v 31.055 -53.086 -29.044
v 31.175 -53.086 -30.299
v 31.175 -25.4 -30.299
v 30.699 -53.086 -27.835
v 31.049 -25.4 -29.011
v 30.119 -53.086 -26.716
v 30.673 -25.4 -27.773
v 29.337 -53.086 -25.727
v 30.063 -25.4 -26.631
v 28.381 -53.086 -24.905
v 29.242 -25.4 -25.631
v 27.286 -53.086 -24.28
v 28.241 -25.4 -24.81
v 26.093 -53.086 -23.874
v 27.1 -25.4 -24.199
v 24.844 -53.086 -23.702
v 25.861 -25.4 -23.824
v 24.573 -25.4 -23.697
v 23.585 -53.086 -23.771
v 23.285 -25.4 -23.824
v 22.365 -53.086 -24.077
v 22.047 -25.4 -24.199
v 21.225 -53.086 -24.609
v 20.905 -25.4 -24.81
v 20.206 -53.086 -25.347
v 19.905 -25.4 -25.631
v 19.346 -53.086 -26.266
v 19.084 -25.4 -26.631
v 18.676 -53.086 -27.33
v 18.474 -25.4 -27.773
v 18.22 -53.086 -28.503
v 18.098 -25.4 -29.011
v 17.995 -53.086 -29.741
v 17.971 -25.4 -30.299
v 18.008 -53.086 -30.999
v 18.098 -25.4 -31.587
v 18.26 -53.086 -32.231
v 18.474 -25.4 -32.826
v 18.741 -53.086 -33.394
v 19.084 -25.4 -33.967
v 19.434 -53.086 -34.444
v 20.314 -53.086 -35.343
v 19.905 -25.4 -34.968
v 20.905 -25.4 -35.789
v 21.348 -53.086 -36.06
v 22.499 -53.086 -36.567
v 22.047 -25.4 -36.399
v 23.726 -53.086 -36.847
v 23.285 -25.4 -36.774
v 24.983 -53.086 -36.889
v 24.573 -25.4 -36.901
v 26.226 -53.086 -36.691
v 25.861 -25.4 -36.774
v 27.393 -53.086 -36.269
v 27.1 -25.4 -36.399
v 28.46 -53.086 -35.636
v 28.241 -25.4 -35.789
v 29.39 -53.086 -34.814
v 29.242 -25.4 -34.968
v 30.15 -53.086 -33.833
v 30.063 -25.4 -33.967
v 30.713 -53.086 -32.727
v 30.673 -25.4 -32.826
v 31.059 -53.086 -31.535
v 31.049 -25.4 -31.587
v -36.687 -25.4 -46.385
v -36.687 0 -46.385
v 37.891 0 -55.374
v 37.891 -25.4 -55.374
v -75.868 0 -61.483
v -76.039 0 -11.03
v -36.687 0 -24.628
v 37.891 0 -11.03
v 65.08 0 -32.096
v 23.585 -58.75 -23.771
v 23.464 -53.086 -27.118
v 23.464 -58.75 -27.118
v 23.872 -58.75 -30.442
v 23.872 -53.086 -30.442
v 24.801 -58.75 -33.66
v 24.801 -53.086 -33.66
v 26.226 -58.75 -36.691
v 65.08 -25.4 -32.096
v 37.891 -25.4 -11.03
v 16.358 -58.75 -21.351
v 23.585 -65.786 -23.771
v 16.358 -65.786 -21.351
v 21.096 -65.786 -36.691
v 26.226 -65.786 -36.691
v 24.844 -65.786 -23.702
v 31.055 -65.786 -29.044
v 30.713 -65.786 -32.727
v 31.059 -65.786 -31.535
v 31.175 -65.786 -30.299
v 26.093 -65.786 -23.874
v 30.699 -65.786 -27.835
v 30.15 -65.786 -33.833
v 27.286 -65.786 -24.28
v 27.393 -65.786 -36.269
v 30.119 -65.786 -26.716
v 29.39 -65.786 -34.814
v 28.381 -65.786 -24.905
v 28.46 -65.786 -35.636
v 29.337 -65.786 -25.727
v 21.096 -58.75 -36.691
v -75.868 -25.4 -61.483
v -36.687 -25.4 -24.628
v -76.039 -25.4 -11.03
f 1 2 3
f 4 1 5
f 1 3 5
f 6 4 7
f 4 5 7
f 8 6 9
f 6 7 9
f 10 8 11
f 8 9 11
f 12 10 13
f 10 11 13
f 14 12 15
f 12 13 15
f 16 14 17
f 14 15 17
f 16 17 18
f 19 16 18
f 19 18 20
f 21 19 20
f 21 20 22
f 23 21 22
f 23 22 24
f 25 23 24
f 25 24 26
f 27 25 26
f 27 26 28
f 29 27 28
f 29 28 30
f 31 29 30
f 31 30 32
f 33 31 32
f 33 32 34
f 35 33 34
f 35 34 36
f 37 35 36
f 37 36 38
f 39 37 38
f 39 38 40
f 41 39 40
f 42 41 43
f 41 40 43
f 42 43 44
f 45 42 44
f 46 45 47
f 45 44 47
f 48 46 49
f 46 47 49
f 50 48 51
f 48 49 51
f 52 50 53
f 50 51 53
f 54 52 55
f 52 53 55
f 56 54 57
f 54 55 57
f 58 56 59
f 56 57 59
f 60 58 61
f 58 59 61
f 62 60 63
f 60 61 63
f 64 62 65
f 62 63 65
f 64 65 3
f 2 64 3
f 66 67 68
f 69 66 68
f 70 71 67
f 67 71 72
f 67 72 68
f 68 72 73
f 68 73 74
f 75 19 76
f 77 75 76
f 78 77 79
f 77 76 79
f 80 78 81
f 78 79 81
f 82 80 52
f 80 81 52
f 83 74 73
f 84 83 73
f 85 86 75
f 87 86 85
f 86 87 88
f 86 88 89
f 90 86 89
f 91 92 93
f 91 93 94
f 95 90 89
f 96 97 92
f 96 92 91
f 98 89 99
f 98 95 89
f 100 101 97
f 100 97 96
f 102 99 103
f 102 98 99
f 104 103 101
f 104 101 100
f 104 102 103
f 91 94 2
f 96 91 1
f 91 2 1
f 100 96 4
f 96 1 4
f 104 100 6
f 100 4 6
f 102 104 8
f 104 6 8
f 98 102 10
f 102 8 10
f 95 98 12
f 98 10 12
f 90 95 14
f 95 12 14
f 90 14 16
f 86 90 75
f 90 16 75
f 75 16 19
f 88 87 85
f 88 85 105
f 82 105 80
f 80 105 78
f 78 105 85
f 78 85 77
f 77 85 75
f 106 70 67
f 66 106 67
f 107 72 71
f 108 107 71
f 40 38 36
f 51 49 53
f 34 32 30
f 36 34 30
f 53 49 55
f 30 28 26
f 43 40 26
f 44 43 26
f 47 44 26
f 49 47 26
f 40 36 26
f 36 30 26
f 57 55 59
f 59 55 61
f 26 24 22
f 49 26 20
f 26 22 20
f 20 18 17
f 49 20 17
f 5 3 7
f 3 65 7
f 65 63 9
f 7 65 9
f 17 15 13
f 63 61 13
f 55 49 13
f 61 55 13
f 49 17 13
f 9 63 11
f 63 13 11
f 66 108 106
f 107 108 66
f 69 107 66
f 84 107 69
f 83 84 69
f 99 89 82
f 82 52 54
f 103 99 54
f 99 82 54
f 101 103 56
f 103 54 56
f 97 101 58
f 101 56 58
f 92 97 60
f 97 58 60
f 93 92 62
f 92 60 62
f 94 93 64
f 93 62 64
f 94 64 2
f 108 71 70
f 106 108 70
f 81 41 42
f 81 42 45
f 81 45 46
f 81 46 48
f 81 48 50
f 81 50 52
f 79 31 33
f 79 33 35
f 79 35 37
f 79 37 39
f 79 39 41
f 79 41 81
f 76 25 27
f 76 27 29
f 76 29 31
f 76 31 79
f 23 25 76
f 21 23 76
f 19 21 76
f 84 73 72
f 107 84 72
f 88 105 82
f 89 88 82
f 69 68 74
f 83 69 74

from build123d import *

# Parameters (mm, degrees)
F0_R     = 4.7594660515
F1_DEPTH = 25.4
F2_R     = 6.6022269286
F3_DEPTH = 27.686
F5_DEPTH = 12.7
F7_DEPTH = 7.0358


with BuildPart() as f1:
    # F0 (on Front) → F1 (new body)
    with BuildSketch(Plane.XZ):
        Polygon((-36.6872698069, -24.628309533), (-76.0387508444, -11.0303815454), (-75.8683719788, -61.4831332203), (-36.6872698069, -46.384561923), (37.8912314773, -55.3742349148), (65.0804936886, -32.0959575474), (37.8912314773, -11.0303815454), align=None)
        with Locations((26.4151897281, -32.2757959366)):
            Circle(F0_R, mode=Mode.SUBTRACT)
        with Locations((26.4151897281, -32.2757959366)):
            Circle(F0_R)
    extrude(amount=F1_DEPTH)


with BuildPart() as f3:
    # F2 (on face) → F3 (new body)
    with BuildSketch(Plane.XZ.offset(25.4)):
        with Locations((24.5732702315, -30.2991122007)):
            Circle(F2_R)
    extrude(amount=F3_DEPTH)

    # F4 (on face) → F5 (join)
    with BuildSketch(Plane.XZ.offset(53.086)):
        with BuildLine():
            ThreePointArc((31.1754971601, -30.2991122007), (28.8783233748, -25.2935235391), (23.5853557969, -23.7712162544))
            ThreePointArc((23.5853557969, -23.7712162544), (23.8724175455, -30.4423348627), (26.2256229469, -36.6912269463))
            ThreePointArc((26.2256229469, -36.6912269463), (29.7933568213, -34.3414007124), (31.1754971601, -30.2991122007))
        make_face()
    extrude(amount=F5_DEPTH)

    # F6 (on face) → F7 (join)
    with BuildSketch(Plane.XZ.offset(65.786)):
        with BuildLine():
            ThreePointArc((26.2256229469, -36.6912269463), (23.8724175455, -30.4423348627), (23.5853557969, -23.7712162544))
            Line((23.5853557969, -23.7712162544), (16.3578391075, -21.3506240398))
            Line((16.3578391075, -21.3506240398), (21.0964120924, -36.6912269463))
            Line((21.0964120924, -36.6912269463), (26.2256229469, -36.6912269463))
        make_face()
    extrude(amount=-F7_DEPTH)


solid = Compound([f1.part, f3.part])
